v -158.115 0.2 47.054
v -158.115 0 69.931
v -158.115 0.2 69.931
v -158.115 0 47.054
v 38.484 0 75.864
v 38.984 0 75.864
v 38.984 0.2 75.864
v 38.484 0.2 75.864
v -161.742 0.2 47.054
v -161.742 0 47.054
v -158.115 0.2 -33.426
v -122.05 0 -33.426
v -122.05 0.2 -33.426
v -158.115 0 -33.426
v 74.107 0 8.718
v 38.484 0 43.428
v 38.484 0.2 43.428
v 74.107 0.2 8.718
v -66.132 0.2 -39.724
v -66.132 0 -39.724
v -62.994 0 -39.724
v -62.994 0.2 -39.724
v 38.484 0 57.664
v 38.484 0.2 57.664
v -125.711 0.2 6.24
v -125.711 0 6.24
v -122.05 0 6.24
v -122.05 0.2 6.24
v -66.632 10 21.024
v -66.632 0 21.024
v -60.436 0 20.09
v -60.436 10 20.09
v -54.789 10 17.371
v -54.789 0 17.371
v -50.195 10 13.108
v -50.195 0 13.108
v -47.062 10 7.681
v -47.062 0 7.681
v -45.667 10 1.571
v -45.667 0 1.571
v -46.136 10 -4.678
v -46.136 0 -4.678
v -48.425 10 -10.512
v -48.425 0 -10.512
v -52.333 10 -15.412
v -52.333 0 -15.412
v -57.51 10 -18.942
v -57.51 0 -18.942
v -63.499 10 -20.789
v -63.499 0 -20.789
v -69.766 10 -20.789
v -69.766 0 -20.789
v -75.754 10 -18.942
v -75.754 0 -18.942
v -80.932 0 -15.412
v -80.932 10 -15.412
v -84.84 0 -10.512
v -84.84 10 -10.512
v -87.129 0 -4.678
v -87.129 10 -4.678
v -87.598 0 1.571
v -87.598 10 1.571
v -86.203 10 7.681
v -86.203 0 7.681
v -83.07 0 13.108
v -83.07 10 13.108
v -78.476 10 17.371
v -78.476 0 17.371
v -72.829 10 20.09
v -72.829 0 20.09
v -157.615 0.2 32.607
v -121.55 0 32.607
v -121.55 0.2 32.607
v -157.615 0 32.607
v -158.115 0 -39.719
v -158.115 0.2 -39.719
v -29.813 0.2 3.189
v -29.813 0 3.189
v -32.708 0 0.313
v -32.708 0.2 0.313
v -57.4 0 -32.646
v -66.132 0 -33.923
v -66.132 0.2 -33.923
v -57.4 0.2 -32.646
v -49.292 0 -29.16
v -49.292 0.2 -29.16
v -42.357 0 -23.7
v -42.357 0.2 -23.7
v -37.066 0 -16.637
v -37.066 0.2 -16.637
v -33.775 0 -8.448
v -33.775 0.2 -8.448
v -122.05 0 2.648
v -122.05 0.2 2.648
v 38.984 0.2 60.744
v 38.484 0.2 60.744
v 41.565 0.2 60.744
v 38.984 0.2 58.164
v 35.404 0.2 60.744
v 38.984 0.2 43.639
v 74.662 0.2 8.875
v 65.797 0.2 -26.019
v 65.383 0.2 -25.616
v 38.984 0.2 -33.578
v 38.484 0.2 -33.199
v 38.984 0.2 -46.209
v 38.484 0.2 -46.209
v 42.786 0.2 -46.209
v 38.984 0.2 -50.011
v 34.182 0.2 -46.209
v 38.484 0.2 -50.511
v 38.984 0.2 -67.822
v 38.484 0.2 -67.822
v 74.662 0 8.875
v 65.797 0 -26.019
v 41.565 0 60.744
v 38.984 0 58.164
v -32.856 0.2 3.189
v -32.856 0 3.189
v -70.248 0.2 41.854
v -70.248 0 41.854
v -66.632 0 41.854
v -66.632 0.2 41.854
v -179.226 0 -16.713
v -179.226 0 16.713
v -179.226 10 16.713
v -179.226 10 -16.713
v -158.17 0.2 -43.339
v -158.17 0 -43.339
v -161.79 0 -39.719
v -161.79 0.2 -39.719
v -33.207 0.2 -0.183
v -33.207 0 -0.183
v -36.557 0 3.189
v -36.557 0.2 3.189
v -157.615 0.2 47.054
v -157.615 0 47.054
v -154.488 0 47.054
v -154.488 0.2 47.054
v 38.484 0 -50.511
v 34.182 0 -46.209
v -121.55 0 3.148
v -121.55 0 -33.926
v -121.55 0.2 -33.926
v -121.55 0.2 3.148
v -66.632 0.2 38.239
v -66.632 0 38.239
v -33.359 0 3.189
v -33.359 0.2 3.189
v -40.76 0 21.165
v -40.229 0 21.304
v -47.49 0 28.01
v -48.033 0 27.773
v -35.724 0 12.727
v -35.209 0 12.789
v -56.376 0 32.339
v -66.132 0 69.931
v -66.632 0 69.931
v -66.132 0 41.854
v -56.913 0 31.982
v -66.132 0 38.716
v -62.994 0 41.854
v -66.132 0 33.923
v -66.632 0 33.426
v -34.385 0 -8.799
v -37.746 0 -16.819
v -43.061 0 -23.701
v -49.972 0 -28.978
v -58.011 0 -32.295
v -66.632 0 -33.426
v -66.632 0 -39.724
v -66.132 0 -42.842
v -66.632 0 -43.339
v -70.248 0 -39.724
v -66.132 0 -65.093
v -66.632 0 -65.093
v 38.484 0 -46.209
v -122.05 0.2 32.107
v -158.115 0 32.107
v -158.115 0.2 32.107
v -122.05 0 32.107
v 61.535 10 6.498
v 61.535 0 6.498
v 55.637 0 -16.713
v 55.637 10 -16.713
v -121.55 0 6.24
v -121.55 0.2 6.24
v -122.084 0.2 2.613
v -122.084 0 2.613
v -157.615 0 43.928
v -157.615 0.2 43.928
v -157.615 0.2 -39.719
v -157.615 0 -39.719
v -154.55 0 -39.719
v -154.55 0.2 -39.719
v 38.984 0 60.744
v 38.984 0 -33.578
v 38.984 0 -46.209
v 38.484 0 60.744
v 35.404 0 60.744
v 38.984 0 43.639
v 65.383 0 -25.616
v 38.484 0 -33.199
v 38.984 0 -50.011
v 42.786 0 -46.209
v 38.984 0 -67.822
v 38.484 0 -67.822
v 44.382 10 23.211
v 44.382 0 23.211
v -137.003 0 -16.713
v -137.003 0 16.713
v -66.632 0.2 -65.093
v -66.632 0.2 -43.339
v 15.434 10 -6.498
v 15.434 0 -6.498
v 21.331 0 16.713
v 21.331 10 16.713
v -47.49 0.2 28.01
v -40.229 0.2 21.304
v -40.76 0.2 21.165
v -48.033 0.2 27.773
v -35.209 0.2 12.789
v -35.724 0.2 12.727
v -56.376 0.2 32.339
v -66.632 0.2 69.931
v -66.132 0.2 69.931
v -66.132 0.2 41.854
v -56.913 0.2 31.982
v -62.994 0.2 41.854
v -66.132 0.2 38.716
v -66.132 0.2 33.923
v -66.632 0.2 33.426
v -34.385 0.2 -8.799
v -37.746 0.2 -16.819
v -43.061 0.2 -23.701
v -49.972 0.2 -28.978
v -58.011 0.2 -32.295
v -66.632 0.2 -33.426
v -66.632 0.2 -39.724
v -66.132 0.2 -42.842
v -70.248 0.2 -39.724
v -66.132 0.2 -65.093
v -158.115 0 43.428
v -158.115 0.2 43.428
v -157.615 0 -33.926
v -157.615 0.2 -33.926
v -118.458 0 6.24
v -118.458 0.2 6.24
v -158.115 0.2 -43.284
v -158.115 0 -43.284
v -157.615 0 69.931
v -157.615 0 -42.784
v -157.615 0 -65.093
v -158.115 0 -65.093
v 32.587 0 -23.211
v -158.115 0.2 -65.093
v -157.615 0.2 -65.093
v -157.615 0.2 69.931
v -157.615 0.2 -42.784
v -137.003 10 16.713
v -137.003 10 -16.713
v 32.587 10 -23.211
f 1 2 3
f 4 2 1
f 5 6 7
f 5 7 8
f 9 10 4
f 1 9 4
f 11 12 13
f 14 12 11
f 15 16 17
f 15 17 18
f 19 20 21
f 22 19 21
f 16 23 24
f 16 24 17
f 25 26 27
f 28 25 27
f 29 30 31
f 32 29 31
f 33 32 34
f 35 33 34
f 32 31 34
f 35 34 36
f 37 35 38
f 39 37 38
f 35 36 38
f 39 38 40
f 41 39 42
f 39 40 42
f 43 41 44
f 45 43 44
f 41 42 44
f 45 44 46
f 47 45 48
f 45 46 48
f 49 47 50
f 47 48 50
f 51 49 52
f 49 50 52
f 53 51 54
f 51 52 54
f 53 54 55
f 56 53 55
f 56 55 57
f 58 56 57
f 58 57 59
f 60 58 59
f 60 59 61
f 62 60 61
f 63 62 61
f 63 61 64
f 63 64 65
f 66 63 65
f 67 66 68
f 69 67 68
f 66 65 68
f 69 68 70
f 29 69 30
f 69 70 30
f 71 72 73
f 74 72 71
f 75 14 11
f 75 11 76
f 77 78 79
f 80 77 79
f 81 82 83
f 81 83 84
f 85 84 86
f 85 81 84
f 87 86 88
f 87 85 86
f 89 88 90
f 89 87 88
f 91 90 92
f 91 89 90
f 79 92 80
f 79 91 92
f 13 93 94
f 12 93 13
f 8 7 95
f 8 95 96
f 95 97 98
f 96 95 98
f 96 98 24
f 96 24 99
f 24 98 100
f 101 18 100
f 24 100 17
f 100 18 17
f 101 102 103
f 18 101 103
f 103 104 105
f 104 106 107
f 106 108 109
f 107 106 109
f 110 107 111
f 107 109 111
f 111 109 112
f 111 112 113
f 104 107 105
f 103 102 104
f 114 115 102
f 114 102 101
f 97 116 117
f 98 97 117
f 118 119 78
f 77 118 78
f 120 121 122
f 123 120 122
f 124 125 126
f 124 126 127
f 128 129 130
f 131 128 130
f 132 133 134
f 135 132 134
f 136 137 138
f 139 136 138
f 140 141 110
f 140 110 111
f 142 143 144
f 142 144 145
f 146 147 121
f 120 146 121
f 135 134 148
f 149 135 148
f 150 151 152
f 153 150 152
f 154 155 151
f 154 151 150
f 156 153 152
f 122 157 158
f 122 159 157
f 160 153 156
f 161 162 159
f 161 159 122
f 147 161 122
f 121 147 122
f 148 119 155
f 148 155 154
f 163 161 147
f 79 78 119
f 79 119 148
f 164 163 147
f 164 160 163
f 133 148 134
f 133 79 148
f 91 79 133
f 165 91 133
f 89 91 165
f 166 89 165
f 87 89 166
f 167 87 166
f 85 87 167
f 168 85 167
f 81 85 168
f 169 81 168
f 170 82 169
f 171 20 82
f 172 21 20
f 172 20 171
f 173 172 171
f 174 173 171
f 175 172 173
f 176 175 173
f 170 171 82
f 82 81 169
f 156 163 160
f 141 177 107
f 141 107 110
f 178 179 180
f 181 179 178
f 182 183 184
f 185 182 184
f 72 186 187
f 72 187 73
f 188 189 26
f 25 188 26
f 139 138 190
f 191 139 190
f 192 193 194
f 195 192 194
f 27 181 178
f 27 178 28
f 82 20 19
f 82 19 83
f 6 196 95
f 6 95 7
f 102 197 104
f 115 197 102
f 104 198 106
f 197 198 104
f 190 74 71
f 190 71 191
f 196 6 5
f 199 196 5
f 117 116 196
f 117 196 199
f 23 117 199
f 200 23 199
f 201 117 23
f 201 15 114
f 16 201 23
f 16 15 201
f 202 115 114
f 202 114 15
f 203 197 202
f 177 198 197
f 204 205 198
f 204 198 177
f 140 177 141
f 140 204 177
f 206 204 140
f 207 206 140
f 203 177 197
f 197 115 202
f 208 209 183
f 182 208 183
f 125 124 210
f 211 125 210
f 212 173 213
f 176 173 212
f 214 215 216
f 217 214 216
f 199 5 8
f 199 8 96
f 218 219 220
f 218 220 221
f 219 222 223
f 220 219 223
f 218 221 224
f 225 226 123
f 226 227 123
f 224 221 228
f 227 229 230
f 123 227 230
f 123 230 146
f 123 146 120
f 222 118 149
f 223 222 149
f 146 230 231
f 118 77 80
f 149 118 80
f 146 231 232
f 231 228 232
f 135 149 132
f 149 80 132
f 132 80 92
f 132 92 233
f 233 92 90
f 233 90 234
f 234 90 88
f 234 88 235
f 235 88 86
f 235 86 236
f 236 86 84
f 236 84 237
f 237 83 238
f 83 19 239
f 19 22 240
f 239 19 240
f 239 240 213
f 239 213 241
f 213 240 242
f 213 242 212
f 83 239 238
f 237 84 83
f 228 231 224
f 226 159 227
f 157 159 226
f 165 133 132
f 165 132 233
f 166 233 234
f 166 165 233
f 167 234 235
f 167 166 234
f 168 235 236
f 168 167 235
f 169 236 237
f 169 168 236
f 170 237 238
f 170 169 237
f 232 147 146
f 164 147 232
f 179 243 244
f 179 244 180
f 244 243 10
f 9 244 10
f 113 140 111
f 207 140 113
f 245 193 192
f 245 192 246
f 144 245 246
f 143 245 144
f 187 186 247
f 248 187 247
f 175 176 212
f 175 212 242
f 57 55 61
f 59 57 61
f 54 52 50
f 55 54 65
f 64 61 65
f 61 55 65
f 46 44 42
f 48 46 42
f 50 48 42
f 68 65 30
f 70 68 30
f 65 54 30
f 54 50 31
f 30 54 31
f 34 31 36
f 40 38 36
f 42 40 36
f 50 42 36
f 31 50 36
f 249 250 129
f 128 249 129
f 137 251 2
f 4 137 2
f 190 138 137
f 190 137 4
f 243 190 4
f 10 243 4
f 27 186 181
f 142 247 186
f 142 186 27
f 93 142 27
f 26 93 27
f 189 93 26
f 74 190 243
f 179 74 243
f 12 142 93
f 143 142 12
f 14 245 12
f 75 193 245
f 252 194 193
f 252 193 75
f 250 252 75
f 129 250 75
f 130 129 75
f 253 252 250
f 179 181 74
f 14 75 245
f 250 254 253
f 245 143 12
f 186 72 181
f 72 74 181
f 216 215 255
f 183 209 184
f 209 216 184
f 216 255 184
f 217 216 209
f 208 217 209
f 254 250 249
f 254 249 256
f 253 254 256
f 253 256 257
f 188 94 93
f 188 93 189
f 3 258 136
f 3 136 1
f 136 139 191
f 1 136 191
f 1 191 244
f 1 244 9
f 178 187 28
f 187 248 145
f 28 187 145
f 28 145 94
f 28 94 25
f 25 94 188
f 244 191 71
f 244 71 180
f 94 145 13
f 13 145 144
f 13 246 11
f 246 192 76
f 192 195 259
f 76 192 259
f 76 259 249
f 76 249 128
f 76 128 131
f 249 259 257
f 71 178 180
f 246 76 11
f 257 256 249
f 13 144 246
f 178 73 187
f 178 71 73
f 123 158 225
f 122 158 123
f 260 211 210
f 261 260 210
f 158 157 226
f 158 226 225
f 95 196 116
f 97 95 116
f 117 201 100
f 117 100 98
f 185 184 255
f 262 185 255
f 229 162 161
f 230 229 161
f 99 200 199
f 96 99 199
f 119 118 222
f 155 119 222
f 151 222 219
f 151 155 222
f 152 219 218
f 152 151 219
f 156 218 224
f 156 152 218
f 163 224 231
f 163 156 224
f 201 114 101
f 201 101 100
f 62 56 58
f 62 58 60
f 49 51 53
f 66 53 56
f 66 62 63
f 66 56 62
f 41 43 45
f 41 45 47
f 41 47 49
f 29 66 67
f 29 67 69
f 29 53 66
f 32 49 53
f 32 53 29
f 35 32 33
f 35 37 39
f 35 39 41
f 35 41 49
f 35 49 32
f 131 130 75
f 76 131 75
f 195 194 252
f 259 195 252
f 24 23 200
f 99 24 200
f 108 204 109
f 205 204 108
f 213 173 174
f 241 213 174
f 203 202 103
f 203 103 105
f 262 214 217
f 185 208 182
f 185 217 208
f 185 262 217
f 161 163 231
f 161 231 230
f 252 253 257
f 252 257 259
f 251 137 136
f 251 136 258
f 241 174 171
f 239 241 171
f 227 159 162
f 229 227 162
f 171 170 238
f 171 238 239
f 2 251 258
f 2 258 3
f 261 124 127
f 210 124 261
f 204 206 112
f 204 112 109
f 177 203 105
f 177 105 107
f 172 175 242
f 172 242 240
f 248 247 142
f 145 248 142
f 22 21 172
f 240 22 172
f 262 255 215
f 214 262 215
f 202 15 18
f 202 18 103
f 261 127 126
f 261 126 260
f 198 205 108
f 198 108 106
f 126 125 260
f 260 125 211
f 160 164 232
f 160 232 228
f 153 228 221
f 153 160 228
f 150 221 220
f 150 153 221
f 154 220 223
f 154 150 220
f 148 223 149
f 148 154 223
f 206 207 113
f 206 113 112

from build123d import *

# Parameters (mm, degrees)
SKETCH1_W             = 42.222572062
SKETCH1_H             = 33.426202882
BOSS_EXTRUDE1_DEPTH   = 10
BOSS_EXTRUDE1_2_DEPTH = 10
SKETCH1_R             = 21.024058424
BOSS_EXTRUDE1_3_DEPTH = 10
BOSS_EXTRUDE3_DEPTH   = 0.2
BOSS_EXTRUDE3_2_DEPTH = 0.2
BOSS_EXTRUDE3_3_DEPTH = 0.2
BOSS_EXTRUDE3_4_DEPTH = 0.2
BOSS_EXTRUDE3_5_DEPTH = 0.2
BOSS_EXTRUDE3_6_DEPTH = 0.2
BOSS_EXTRUDE3_7_DEPTH = 0.2
BOSS_EXTRUDE3_8_DEPTH = 0.2
EXTRUDE_THIN1_DEPTH   = 0.2


with BuildPart() as part:
    # Sketch1 → Boss-Extrude1 (new body)
    with BuildSketch(Plane(origin=(0, 0, 0), x_dir=(1, 0, 0), z_dir=(0, 1, 0))):
        with Locations((-158.114736003, 0)):
            Rectangle(SKETCH1_W, SKETCH1_H)
    extrude(amount=BOSS_EXTRUDE1_DEPTH)


with BuildPart() as body_2:
    # Sketch1 → Boss-Extrude1 2 (new body)
    with BuildSketch(Plane(origin=(0, 0, 0), x_dir=(1, 0, 0), z_dir=(0, 1, 0))):
        Polygon((61.534545535, -6.498313662), (55.637035061, 16.713101441), (32.586604687, 23.211415103), (15.433684787, 6.498313662), (21.331195261, -16.713101441), (44.381625635, -23.211415103), align=None)
    extrude(amount=BOSS_EXTRUDE1_2_DEPTH)


with BuildPart() as body_3:
    # Sketch1 → Boss-Extrude1 3 (new body)
    with BuildSketch(Plane(origin=(0, 0, 0), x_dir=(1, 0, 0), z_dir=(0, 1, 0))):
        with Locations((-66.632496535, 0)):
            Circle(SKETCH1_R)
    extrude(amount=BOSS_EXTRUDE1_3_DEPTH)


with BuildPart() as body_4:
    # Sketch1<5> → Boss-Extrude3 (new body)
    with BuildSketch(Plane(origin=(0, 0, 0), x_dir=(1, 0, 0), z_dir=(0, 1, 0))):
        Polygon((-161.789605496, 39.719403423), (-154.550133398, 39.719403423), (-158.169869447, 43.339139472), align=None)
    extrude(amount=BOSS_EXTRUDE3_DEPTH)



with BuildPart() as body_5:
    # Sketch1<5> → Boss-Extrude3 2 (new body)
    with BuildSketch(Plane(origin=(0, 0, 0), x_dir=(1, 0, 0), z_dir=(0, 1, 0))):
        Polygon((-125.711262238, -6.240180357), (-118.457543425, -6.240180357), (-122.084402832, -2.61332095), align=None)
    extrude(amount=BOSS_EXTRUDE3_2_DEPTH)


with BuildPart() as body_6:
    # Sketch1<5> → Boss-Extrude3 3 (new body)
    with BuildSketch(Plane(origin=(0, 0, 0), x_dir=(1, 0, 0), z_dir=(0, 1, 0))):
        Polygon((-154.487876597, -47.054493097), (-158.114736003, -43.42763369), (-161.74159541, -47.054493097), align=None)
    extrude(amount=BOSS_EXTRUDE3_3_DEPTH)


with BuildPart() as body_7:
    # Sketch1<5> → Boss-Extrude3 4 (new body)
    with BuildSketch(Plane(origin=(0, 0, 0), x_dir=(1, 0, 0), z_dir=(0, 1, 0))):
        Polygon((-70.247620953, -41.854454505), (-62.993902139, -41.854454505), (-66.620761546, -38.227595098), align=None)
    extrude(amount=BOSS_EXTRUDE3_4_DEPTH)


with BuildPart() as body_8:
    # Sketch1<5> → Boss-Extrude3 5 (new body)
    with BuildSketch(Plane(origin=(0, 0, 0), x_dir=(1, 0, 0), z_dir=(0, 1, 0))):
        Polygon((-70.247620953, 39.724015055), (-62.993902139, 39.724015055), (-66.632496535, 43.339139472), align=None)
    extrude(amount=BOSS_EXTRUDE3_5_DEPTH)


with BuildPart() as body_9:
    # Sketch1<5> → Boss-Extrude3 6 (new body)
    with BuildSketch(Plane(origin=(0, 0, 0), x_dir=(1, 0, 0), z_dir=(0, 1, 0))):
        Polygon((-36.556845653, -3.188815019), (-29.813104019, -3.188815019), (-33.206794515, 0.182985198), align=None)
    extrude(amount=BOSS_EXTRUDE3_6_DEPTH)


with BuildPart() as body_10:
    # Sketch1<5> → Boss-Extrude3 7 (new body)
    with BuildSketch(Plane(origin=(0, 0, 0), x_dir=(1, 0, 0), z_dir=(0, 1, 0))):
        Polygon((34.182162541, 46.208758205), (42.786067781, 46.208758205), (38.484115161, 50.510710825), align=None)
    extrude(amount=BOSS_EXTRUDE3_7_DEPTH)


with BuildPart() as body_11:
    # Sketch1<5> → Boss-Extrude3 8 (new body)
    with BuildSketch(Plane(origin=(0, 0, 0), x_dir=(1, 0, 0), z_dir=(0, 1, 0))):
        Polygon((41.564686711, -60.744358452), (38.484115161, -57.663786901), (35.40354361, -60.744358452), align=None)
    extrude(amount=BOSS_EXTRUDE3_8_DEPTH)


with BuildPart() as body_4_1:
    add(body_4.part)

    add(body_5.part)  # Extrude-Thin1 merges body 5

    add(body_6.part)  # Extrude-Thin1 merges body 6

    add(body_7.part)  # Extrude-Thin1 merges body 7

    add(body_8.part)  # Extrude-Thin1 merges body 8

    add(body_9.part)  # Extrude-Thin1 merges body 9

    add(body_10.part)  # Extrude-Thin1 merges body 10

    add(body_11.part)  # Extrude-Thin1 merges body 11
    # Sketch1<6> → Extrude-Thin1 (add)
    with BuildSketch(Plane(origin=(0, 0, 0), x_dir=(1, 0, 0), z_dir=(0, 1, 0))):
        Polygon((-158.114736003, -69.931134978), (-158.114736003, -32.106747506), (-122.049622367, -32.106747506), (-122.049622367, 33.426202882), (-158.114736003, 33.426202882), (-158.114736003, 65.093131929), (-157.614736003, 65.093131929), (-157.614736003, 33.926202882), (-121.549622367, 33.926202882), (-121.549622367, -32.606747506), (-157.614736003, -32.606747506), (-157.614736003, -69.931134978), align=None)
        with BuildLine():
            Line((-66.632496535, -69.931134978), (-66.632496535, -33.426202882))
            ThreePointArc((-66.632496535, -33.426202882), (-33.206293653, 0), (-66.632496535, 33.426202882))
            Line((-66.632496535, 33.426202882), (-66.632496535, 65.093131929))
            Line((-66.632496535, 65.093131929), (-66.132496535, 65.093131929))
            Line((-66.132496535, 65.093131929), (-66.132496535, 33.922518215))
            ThreePointArc((-66.132496535, 33.922518215), (-32.706293653, 0), (-66.132496535, -33.922518215))
            Line((-66.132496535, -33.922518215), (-66.132496535, -69.931134978))
            Line((-66.132496535, -69.931134978), (-66.632496535, -69.931134978))
        make_face()
        Polygon((38.484115161, -75.86382441), (38.484115161, -43.42763369), (74.106727986, -8.718421193), (65.38310896, 25.615988777), (38.484115161, 33.199278809), (38.484115161, 67.82214284), (38.984115161, 67.82214284), (38.984115161, 33.577809682), (65.796624306, 26.018901165), (74.662418023, -8.875079793), (38.984115161, -43.638554377), (38.984115161, -75.86382441), align=None)
    extrude(amount=EXTRUDE_THIN1_DEPTH)


solid = Compound([part.part, body_2.part, body_3.part, body_4_1.part])
